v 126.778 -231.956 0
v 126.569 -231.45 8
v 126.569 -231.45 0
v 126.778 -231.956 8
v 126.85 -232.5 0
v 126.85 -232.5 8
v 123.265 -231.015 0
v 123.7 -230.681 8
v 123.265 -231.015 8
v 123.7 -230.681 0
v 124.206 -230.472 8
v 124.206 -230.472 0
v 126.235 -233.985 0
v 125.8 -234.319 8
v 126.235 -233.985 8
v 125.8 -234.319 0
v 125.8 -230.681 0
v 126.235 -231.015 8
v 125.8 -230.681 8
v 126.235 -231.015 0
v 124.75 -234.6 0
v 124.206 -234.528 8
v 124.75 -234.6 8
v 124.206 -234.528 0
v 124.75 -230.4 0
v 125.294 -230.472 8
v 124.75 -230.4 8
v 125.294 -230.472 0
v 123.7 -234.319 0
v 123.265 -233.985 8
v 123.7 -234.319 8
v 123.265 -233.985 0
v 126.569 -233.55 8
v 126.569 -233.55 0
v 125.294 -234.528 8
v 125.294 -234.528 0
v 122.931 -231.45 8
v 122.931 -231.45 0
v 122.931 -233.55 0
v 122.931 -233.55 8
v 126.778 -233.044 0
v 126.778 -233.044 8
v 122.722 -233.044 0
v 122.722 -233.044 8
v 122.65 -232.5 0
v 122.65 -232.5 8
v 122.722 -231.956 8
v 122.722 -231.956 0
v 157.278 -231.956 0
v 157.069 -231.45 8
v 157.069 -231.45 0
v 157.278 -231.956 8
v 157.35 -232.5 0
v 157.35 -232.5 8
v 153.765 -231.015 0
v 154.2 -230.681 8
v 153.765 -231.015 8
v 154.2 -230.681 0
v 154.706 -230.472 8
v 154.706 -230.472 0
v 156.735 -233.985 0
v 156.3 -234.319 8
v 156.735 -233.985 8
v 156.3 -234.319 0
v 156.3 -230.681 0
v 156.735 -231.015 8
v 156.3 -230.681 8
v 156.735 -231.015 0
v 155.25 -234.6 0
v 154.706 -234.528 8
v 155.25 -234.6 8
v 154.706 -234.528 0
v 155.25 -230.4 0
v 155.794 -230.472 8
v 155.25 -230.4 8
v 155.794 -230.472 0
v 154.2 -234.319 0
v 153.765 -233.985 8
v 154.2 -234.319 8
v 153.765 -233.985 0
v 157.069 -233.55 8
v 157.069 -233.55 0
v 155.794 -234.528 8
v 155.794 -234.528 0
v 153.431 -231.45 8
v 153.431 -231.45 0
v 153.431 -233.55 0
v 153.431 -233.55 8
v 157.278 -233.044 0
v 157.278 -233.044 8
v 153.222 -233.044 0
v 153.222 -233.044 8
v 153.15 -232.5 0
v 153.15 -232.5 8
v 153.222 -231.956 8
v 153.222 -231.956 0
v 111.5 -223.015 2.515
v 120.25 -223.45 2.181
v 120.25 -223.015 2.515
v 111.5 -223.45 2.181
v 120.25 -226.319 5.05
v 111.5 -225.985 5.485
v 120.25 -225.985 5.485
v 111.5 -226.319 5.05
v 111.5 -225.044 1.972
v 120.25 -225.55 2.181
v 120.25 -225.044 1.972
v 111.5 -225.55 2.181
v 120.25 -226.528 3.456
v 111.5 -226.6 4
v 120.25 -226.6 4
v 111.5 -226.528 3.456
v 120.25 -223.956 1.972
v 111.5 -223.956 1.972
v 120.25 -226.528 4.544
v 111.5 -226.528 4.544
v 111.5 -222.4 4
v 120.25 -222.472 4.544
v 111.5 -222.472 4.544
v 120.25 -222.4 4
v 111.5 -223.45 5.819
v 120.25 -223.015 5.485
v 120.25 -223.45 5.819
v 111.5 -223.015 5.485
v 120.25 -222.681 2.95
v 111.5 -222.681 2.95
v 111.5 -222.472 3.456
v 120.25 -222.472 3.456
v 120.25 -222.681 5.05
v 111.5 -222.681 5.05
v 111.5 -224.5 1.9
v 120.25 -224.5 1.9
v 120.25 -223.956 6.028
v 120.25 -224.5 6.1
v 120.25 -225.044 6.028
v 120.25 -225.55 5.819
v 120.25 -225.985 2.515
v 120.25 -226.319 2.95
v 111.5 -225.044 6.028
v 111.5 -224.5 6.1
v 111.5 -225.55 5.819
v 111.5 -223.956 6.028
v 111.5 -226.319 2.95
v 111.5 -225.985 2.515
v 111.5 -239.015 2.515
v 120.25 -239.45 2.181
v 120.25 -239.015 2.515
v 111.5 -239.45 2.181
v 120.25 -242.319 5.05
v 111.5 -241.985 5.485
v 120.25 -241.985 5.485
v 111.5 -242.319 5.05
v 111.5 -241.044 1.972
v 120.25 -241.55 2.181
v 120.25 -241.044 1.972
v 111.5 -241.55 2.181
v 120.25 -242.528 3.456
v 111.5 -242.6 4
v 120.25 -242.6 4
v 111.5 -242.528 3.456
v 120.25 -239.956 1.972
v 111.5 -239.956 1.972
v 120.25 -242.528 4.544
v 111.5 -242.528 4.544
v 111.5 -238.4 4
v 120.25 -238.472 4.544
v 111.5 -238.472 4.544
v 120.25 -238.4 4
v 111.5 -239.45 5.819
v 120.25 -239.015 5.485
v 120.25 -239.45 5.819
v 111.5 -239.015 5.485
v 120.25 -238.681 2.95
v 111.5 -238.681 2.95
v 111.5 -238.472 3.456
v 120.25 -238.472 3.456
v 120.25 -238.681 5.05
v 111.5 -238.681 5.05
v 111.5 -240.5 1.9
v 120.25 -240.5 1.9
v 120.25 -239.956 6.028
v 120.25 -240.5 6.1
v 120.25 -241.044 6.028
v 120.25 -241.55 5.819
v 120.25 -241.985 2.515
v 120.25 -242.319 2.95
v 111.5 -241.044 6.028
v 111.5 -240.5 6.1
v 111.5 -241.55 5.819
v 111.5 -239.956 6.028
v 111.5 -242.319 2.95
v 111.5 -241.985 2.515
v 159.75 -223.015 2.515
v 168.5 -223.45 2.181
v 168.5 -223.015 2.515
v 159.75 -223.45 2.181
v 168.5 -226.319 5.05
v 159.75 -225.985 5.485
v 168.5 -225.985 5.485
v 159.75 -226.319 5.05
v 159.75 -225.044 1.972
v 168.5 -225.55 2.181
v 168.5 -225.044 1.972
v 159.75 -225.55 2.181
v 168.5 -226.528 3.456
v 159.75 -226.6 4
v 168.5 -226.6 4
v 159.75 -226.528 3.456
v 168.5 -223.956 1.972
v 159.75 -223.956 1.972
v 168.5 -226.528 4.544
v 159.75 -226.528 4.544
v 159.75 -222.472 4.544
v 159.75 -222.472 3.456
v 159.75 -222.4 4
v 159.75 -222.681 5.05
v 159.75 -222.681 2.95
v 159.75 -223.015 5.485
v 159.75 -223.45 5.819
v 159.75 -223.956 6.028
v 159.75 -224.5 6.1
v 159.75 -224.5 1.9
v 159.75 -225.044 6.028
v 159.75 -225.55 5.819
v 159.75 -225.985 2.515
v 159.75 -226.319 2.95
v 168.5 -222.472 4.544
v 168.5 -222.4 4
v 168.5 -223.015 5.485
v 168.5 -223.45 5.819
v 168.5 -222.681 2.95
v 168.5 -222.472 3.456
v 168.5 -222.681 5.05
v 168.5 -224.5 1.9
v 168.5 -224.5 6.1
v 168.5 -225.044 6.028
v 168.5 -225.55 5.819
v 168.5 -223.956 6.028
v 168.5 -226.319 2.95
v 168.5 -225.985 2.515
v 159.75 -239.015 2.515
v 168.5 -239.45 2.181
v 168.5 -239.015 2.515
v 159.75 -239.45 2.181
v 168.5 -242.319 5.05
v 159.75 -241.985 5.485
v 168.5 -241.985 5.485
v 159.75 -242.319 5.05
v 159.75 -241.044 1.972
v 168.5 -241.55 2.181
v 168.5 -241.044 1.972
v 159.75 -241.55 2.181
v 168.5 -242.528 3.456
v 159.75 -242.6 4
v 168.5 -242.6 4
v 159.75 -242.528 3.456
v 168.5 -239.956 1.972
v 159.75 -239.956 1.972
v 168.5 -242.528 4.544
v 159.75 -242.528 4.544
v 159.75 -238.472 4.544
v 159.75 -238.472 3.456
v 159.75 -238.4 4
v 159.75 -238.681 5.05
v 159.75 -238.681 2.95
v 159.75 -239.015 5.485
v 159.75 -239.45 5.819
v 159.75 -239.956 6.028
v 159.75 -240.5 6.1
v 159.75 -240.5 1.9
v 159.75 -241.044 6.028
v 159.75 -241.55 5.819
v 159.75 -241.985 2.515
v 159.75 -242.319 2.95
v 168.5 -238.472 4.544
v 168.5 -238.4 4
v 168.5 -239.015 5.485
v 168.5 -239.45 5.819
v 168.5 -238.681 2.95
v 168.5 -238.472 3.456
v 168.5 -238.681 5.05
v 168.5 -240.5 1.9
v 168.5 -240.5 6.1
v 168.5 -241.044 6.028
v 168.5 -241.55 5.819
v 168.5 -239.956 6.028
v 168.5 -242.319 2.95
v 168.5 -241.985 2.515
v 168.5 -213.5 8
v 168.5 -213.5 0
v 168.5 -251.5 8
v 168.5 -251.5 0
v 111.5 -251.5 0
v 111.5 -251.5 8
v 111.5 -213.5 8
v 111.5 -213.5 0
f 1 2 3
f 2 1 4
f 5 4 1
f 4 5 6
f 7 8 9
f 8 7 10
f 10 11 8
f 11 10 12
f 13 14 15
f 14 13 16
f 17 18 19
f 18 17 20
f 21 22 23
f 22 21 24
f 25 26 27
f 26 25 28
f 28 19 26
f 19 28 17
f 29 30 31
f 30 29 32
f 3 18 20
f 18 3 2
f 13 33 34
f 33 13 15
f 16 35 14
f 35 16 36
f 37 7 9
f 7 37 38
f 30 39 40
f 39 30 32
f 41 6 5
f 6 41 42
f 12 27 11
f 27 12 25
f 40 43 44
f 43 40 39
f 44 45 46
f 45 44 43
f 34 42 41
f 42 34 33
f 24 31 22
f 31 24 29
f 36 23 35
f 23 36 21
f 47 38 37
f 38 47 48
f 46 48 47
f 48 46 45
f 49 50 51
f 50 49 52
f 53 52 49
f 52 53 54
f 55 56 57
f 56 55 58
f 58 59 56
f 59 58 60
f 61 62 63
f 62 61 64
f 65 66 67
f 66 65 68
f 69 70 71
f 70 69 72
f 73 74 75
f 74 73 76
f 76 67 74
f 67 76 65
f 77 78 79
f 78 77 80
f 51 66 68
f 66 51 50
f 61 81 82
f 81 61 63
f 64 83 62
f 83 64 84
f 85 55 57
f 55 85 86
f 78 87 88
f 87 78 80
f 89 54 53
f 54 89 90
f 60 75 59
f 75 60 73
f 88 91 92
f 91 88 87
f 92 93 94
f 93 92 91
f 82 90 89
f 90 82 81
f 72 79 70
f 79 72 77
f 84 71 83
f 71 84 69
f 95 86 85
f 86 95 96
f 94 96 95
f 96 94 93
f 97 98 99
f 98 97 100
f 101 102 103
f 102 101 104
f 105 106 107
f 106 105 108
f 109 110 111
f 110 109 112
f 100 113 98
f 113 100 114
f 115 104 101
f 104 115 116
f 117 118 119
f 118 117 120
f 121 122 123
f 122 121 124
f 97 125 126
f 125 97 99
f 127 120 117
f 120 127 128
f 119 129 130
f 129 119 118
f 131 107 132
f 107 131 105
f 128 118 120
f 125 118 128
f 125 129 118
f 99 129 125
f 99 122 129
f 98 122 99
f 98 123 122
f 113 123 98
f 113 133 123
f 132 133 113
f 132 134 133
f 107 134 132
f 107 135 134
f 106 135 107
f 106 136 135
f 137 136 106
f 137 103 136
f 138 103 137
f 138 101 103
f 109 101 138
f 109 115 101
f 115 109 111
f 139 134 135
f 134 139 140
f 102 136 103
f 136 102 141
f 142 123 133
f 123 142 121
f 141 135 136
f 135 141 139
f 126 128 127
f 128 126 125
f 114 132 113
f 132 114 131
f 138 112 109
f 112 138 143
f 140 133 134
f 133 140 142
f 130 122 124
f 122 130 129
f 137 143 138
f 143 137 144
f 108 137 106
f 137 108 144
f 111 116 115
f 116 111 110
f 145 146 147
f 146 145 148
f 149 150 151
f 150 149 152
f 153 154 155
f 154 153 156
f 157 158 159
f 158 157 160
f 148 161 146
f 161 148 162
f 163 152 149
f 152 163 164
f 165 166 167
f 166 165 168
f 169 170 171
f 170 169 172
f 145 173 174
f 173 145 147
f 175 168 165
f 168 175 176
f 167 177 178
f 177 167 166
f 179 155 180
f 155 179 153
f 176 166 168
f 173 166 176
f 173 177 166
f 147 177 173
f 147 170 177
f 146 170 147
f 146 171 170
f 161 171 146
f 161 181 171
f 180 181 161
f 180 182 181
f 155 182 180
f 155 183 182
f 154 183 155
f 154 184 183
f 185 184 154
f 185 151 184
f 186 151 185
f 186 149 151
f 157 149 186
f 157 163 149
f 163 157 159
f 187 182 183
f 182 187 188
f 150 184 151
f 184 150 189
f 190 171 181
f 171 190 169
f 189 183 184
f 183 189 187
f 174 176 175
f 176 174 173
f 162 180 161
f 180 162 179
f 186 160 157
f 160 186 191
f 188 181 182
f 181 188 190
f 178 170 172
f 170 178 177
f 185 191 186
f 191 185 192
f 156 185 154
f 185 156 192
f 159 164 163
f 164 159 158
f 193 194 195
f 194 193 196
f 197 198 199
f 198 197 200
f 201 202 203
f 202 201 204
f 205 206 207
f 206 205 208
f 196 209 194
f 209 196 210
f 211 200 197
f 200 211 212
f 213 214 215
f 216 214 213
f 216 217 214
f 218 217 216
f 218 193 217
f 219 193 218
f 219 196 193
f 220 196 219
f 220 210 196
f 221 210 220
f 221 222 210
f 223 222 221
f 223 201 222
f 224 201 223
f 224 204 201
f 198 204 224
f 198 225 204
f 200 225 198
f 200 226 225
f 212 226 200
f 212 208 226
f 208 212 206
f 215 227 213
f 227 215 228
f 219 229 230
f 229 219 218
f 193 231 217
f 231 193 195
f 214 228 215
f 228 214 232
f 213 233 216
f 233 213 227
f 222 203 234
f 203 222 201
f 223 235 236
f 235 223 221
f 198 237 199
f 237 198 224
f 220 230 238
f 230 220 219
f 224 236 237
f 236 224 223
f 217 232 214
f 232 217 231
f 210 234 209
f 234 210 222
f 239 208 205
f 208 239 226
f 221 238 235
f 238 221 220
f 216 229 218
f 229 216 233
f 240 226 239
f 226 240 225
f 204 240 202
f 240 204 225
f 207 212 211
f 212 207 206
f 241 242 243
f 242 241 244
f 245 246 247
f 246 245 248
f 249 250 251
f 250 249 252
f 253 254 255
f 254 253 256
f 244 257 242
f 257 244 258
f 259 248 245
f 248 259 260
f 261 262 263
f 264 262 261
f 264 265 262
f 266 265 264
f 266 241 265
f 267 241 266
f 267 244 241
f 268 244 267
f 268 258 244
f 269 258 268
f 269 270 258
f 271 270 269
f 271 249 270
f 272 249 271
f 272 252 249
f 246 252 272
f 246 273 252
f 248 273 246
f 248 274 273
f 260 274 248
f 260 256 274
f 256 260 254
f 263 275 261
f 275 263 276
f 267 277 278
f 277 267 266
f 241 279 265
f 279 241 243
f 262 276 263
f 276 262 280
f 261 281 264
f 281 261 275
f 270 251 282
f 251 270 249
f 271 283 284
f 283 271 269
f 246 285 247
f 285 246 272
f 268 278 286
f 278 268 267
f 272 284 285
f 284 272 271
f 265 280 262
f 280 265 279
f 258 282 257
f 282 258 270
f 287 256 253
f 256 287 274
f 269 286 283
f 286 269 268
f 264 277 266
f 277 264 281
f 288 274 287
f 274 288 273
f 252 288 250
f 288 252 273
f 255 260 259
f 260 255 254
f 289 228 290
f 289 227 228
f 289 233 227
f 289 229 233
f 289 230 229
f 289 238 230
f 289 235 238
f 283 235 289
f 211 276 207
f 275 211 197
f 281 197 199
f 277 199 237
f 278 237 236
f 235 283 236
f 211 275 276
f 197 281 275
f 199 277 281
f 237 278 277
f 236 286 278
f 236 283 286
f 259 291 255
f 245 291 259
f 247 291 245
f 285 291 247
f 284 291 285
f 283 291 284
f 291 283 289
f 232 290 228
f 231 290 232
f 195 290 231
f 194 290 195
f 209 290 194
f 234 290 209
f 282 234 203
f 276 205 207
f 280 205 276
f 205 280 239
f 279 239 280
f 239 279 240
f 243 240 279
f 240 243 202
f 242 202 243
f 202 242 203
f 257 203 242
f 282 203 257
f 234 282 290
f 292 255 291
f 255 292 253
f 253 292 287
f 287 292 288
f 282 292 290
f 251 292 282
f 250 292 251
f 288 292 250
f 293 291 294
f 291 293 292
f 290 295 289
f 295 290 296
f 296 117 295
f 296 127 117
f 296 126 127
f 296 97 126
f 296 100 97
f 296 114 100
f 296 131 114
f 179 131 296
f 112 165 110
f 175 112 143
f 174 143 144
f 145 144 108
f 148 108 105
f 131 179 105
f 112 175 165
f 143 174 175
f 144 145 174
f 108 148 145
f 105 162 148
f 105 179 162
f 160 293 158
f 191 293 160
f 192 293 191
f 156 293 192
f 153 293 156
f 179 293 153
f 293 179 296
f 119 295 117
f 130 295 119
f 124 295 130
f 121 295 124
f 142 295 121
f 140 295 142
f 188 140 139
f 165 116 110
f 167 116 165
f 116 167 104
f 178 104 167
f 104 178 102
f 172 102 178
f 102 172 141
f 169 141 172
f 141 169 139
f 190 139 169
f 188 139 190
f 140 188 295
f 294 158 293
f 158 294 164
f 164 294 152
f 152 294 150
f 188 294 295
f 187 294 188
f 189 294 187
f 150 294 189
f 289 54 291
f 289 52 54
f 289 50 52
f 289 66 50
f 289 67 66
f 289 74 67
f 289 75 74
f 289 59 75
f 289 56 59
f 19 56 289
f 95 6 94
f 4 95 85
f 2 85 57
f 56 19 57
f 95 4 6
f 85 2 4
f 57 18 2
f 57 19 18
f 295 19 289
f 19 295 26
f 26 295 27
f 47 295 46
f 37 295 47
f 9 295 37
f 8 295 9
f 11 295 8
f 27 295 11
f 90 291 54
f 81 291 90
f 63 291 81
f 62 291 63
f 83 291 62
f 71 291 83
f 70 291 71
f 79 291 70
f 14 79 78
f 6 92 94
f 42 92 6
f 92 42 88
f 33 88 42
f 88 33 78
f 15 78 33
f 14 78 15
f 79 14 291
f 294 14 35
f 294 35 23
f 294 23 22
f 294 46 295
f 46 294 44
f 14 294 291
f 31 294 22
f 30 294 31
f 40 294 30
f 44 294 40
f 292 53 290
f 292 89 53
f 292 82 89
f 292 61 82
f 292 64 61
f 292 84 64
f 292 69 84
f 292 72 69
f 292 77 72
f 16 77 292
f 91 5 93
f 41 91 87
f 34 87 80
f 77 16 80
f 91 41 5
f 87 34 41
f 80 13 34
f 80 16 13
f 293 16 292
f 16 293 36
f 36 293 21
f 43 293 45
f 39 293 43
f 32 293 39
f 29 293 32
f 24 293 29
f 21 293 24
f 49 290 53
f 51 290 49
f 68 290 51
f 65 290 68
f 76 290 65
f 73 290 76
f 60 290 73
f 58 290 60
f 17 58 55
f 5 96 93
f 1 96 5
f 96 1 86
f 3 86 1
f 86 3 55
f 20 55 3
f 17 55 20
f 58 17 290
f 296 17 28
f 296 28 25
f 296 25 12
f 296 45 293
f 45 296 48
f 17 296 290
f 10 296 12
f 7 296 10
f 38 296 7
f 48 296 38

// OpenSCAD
include <../lib/meshtastic-drybag-node-lib.scad>;
$fn = 40;
spacer_print(false);
